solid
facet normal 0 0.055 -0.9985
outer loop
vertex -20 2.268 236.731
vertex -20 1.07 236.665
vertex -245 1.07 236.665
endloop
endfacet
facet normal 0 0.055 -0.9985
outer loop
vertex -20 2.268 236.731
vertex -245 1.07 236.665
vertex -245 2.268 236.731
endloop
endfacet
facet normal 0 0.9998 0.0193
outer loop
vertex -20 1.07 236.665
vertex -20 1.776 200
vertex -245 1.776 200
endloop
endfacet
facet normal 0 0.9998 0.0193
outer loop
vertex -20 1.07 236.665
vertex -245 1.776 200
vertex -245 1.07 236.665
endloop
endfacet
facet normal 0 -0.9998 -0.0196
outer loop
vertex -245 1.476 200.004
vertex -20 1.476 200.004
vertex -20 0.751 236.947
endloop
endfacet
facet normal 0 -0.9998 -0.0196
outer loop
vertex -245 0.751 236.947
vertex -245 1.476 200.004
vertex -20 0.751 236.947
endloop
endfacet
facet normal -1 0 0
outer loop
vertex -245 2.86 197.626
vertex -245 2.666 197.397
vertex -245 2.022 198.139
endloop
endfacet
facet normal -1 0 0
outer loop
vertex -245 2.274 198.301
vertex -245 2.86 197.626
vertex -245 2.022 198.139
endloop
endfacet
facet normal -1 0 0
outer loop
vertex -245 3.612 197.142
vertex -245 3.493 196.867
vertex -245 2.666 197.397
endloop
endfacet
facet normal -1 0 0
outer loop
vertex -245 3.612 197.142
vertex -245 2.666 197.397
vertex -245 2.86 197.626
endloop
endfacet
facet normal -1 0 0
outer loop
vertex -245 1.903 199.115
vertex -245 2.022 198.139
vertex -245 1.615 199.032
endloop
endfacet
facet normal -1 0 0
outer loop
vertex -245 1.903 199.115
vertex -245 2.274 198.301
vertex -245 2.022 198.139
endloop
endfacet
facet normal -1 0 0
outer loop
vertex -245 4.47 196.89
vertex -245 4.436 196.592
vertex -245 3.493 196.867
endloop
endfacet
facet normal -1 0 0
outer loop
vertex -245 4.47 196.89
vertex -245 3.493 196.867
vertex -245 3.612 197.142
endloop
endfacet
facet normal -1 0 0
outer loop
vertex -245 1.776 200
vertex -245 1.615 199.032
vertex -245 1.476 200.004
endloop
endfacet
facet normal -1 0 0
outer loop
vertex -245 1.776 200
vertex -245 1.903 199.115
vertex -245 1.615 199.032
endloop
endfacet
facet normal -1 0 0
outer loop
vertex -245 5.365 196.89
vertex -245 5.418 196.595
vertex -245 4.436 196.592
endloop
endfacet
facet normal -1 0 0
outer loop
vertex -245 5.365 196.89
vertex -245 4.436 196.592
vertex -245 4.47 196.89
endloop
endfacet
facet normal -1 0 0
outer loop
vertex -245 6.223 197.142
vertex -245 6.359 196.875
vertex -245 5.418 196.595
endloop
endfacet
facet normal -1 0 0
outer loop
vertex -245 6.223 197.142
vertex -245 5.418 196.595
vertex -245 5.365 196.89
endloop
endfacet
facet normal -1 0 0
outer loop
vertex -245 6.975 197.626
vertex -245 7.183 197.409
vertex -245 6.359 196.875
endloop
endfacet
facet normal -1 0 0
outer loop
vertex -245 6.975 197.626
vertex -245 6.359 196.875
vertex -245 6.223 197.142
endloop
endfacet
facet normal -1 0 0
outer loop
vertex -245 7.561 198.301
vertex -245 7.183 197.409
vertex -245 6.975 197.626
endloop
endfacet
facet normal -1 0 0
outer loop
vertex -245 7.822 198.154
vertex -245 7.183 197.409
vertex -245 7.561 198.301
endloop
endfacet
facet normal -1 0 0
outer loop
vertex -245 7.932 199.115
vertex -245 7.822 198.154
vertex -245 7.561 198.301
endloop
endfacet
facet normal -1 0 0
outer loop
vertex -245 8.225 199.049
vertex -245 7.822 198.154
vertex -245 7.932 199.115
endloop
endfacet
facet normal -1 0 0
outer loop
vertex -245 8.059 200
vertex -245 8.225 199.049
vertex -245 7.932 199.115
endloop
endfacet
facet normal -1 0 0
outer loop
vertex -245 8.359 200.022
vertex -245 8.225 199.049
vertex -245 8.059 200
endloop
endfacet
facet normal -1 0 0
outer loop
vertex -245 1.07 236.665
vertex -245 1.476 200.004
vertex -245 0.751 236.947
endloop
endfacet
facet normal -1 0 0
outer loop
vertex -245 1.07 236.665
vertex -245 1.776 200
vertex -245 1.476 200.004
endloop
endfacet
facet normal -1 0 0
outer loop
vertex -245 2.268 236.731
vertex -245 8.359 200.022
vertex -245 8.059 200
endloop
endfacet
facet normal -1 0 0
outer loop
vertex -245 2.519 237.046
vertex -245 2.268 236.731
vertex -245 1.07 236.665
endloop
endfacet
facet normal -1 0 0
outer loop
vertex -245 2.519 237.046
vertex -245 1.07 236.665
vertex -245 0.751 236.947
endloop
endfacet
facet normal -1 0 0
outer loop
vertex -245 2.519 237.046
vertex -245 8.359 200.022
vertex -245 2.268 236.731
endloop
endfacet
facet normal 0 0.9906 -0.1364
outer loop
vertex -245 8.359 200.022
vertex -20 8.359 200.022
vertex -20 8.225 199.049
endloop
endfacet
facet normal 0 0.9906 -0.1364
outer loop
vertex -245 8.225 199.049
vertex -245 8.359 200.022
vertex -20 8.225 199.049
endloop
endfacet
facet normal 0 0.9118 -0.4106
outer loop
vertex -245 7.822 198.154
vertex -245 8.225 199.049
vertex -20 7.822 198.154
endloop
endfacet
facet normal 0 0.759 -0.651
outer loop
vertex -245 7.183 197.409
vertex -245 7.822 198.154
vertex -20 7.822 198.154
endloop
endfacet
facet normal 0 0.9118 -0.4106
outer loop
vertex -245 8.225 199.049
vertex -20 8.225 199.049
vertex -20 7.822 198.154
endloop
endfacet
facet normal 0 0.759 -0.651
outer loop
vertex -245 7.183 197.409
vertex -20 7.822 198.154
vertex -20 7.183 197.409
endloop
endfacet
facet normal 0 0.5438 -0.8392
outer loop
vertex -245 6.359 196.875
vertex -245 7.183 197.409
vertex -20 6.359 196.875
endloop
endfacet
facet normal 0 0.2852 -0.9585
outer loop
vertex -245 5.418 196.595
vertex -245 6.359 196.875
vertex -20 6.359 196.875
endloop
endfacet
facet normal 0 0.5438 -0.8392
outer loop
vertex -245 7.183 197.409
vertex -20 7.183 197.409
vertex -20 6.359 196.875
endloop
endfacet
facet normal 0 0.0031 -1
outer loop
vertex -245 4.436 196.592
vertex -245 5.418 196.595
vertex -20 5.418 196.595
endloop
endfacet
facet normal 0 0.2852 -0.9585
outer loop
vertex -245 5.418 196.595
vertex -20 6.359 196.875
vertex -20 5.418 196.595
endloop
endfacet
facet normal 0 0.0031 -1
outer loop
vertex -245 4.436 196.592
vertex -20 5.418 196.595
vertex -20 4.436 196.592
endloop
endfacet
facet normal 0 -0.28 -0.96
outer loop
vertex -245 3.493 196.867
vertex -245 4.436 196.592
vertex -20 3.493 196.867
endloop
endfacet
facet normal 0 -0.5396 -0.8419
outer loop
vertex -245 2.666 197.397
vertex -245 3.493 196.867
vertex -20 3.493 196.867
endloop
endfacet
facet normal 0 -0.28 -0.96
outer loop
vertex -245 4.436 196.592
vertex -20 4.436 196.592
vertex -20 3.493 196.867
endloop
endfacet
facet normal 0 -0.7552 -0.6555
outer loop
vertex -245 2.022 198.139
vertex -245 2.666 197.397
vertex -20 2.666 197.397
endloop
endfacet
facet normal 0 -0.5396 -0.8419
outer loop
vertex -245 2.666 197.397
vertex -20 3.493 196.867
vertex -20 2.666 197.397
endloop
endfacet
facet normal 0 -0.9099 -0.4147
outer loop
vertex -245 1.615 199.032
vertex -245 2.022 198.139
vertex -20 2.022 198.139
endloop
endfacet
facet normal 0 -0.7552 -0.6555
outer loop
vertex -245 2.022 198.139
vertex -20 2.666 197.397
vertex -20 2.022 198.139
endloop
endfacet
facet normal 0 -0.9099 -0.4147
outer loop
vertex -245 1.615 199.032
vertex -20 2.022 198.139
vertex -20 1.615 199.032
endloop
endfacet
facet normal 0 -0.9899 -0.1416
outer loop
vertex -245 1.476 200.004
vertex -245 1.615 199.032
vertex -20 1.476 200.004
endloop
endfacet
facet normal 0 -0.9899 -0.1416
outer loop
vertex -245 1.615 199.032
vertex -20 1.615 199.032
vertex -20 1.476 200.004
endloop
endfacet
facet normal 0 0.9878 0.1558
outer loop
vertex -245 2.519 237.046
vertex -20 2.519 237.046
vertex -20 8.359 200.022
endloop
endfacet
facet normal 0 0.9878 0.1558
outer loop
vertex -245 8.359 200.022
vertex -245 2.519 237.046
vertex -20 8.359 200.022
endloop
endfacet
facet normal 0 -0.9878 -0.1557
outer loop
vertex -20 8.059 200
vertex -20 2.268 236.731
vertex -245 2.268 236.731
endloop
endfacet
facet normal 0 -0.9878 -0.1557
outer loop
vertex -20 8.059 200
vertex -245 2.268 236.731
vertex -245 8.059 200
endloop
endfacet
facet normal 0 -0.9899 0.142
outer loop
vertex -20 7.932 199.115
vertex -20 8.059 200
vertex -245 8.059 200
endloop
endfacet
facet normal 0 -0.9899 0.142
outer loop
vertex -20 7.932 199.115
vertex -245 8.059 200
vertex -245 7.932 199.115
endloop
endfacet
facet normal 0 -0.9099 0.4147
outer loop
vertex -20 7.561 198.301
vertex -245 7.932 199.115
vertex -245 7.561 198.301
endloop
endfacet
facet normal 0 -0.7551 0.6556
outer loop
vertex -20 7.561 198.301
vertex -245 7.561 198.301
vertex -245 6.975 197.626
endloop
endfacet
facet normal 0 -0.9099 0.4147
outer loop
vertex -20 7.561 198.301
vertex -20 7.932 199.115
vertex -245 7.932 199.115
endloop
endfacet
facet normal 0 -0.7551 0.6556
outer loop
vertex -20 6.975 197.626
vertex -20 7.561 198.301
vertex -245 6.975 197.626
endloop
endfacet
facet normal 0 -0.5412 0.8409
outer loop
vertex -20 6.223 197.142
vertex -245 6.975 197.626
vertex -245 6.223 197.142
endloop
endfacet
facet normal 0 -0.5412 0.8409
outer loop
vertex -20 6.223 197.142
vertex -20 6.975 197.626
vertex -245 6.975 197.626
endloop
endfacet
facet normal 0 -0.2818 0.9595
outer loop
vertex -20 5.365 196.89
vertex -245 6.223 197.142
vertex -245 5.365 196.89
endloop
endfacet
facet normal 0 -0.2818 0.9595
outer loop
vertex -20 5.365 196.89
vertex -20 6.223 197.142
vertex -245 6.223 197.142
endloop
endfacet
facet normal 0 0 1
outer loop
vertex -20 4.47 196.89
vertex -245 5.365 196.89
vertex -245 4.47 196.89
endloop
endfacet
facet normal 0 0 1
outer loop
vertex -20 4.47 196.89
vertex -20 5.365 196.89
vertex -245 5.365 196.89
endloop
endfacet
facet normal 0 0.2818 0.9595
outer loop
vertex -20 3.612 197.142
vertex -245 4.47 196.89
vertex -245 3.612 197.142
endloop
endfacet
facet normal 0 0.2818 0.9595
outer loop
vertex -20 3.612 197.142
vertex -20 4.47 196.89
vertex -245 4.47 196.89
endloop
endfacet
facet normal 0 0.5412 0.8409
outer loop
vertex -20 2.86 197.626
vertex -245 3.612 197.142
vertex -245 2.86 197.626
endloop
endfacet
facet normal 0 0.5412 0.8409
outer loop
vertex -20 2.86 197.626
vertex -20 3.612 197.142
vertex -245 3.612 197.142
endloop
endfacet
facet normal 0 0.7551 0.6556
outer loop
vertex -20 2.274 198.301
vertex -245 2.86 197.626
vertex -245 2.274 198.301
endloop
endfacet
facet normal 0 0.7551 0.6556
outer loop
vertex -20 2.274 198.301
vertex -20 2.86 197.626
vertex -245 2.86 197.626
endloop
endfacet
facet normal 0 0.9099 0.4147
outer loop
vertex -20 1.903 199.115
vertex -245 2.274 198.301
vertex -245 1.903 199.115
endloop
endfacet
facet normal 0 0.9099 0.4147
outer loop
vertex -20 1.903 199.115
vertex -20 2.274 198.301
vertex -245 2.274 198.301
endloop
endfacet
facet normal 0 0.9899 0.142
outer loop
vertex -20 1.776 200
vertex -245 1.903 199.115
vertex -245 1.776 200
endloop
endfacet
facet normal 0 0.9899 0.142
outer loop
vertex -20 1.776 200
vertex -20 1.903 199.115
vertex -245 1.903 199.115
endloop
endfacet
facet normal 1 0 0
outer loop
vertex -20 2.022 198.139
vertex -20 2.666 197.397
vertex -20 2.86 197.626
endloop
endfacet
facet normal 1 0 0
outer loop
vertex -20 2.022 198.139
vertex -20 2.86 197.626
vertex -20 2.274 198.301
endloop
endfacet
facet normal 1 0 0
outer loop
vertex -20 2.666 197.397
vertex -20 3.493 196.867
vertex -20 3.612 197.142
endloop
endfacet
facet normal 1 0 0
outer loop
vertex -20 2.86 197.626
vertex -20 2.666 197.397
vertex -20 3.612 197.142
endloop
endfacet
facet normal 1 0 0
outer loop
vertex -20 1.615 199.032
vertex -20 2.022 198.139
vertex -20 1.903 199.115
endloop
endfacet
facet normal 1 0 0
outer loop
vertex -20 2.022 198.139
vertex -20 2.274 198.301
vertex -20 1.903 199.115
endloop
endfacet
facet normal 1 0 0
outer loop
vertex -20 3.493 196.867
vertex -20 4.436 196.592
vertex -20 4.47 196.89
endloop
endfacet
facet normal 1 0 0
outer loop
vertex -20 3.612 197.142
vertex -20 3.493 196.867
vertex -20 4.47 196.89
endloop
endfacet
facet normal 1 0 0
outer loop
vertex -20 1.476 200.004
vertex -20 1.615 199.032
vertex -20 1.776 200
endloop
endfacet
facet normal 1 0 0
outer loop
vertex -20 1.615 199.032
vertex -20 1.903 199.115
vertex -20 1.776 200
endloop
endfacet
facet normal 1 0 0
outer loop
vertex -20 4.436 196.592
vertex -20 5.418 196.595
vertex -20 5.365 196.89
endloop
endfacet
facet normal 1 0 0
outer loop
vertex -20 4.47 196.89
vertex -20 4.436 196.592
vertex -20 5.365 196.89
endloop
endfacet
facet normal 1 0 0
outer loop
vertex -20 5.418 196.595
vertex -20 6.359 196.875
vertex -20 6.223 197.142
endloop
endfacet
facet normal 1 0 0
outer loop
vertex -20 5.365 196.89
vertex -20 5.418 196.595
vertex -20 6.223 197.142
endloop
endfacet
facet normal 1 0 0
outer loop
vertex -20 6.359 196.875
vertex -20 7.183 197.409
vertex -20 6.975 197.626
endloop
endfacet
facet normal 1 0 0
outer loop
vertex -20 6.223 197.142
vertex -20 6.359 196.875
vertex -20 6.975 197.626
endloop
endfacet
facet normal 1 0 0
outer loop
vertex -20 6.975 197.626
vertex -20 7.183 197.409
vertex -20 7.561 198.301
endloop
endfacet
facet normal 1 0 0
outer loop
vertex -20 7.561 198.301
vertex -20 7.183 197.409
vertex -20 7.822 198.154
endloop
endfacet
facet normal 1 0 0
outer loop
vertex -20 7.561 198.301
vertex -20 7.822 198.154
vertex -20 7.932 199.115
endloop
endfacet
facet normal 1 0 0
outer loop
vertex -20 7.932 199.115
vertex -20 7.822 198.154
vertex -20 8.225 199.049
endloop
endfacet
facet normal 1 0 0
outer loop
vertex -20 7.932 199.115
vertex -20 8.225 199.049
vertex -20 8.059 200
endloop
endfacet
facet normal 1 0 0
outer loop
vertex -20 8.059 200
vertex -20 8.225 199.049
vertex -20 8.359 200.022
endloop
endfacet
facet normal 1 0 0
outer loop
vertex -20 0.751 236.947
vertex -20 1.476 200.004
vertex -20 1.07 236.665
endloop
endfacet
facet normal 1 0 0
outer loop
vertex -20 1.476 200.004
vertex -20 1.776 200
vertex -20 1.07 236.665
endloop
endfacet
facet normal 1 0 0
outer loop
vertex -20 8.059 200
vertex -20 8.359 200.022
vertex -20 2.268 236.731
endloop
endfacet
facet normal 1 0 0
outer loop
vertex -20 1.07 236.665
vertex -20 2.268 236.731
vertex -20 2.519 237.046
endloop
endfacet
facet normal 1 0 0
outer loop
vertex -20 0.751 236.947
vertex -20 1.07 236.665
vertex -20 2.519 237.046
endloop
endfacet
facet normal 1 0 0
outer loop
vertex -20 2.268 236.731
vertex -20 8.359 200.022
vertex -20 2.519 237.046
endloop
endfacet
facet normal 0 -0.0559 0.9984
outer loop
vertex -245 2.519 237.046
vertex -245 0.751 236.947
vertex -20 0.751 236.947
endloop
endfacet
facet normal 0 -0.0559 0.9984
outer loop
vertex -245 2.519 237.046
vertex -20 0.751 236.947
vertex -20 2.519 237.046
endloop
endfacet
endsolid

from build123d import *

# Parameters (mm, degrees)
SCHIZZO1_R               = 1.65
CORPOFOAM_DEPTH          = 225
SCHIZZO4_R               = 1.65
CORPOCENTINA_DEPTH       = 5
RIMOZIONEFOAM_DEPTH      = 337.437145013
INTAGLIOPOSTERIORE_DEPTH = 251.179840316
RIVESTIMENTO_DEPTH       = 225
RIMOZIONECENTINA_DEPTH   = 331.394548547


with BuildPart() as part:
    # Schizzo1 → CorpoFoam (new body)
    with BuildSketch(Plane(origin=(0, 0, 0), x_dir=(0, 0, -1), z_dir=(1, 0, 0))):
        with BuildLine():
            ThreePointArc((-200, 8.059305289), (-196.8581753, 4.91748059), (-200, 1.77565589))
            add(Edge.make_bspline(
                [(-200, 8.059305289), (-202.187379866, 7.739758676), (-207.50572073, 6.94925042), (-215.560350587, 5.731221771), (-223.977157043, 4.293295131), (-231.363413337, 3.181808879), (-237.746440905, 2.098942424), (-242.622069367, 1.245861924), (-246.644529334, 0.552864955), (-248.328398442, 0.246216773), (-250.427328459, -0.052966692), (-248.284955517, 0.172375667), (-246.518112421, 0.308690023), (-242.189387345, 0.685693601), (-236.806461265, 1.074101535), (-229.680385953, 1.497317245), (-221.184158699, 1.823218606), (-211.337618209, 1.967626103), (-204.130566759, 1.879296162), (-200.224163887, 1.781432917), (-200, 1.77565589)],
                knots=[0.90015767, 0.90015767, 0.90015767, 0.90015767, 0.913230871, 0.931955467, 0.948342069, 0.963693004, 0.976235918, 0.986320059, 0.993788799, 0.998424035, 1, 1.001588889, 1.006329218, 1.014202456, 1.025172808, 1.039173483, 1.056060631, 1.075578924, 1.097363607, 1.098689812, 1.098689812, 1.098689812, 1.098689812], degree=3))
        make_face()
        with Locations((-200, 4.91748059)):
            Circle(SCHIZZO1_R, mode=Mode.SUBTRACT)
    extrude(amount=CORPOFOAM_DEPTH)

    # Schizzo6 → RimozioneFoam (cut, through all)
    with BuildSketch(Plane.ZY):
        with BuildLine():
            ThreePointArc((200, 8.05930529), (196.8581753, 4.91748059), (200, 1.77565589))
            add(Edge.make_bspline(
                [(200, 1.77565589), (200.224163887, 1.781432917), (204.130566759, 1.879296162), (211.337618209, 1.967626103), (221.184158699, 1.823218606), (229.680385953, 1.497317245), (236.806461265, 1.074101535), (242.189387345, 0.685693601), (246.518112421, 0.308690023), (248.284955517, 0.172375667), (250.427328459, -0.052966692), (248.328398442, 0.246216773), (246.644529334, 0.552864955), (242.622069367, 1.245861924), (237.746440905, 2.098942424), (231.363413337, 3.181808879), (223.977157043, 4.293295131), (215.560350587, 5.731221771), (207.50572073, 6.94925042), (202.187379866, 7.739758676), (200, 8.05930529)],
                knots=[0.90015767, 0.90015767, 0.90015767, 0.90015767, 0.901483875, 0.923268558, 0.942786851, 0.959673998, 0.973674674, 0.984645025, 0.992518264, 0.997258593, 0.998847482, 1.000423447, 1.005058682, 1.012527423, 1.022611563, 1.035154477, 1.050505413, 1.066892015, 1.085616611, 1.098689812, 1.098689812, 1.098689812, 1.098689812], degree=3))
        make_face()
    extrude(amount=-RIMOZIONEFOAM_DEPTH, mode=Mode.SUBTRACT)


with BuildPart() as body_2:
    # Schizzo4 → CorpoCentina (new body)
    with BuildSketch(Plane.ZY.offset(15)):
        with BuildLine():
            ThreePointArc((200, 8.05930529), (196.8581753, 4.91748059), (200, 1.77565589))
            add(Edge.make_bspline(
                [(200, 1.77565589), (200.224163887, 1.781432917), (204.130566759, 1.879296162), (211.337618209, 1.967626103), (221.184158699, 1.823218606), (229.680385953, 1.497317245), (236.806461265, 1.074101535), (242.189387345, 0.685693601), (246.518112421, 0.308690023), (248.284955517, 0.172375667), (250.427328459, -0.052966692), (248.328398442, 0.246216773), (246.644529334, 0.552864955), (242.622069367, 1.245861924), (237.746440905, 2.098942424), (231.363413337, 3.181808879), (223.977157043, 4.293295131), (215.560350587, 5.731221771), (207.50572073, 6.94925042), (202.187379866, 7.739758676), (200, 8.05930529)],
                knots=[0.90015767, 0.90015767, 0.90015767, 0.90015767, 0.901483875, 0.923268558, 0.942786851, 0.959673998, 0.973674674, 0.984645025, 0.992518264, 0.997258593, 0.998847482, 1.000423447, 1.005058682, 1.012527423, 1.022611563, 1.035154477, 1.050505413, 1.066892015, 1.085616611, 1.098689812, 1.098689812, 1.098689812, 1.098689812], degree=3))
        make_face()
        with Locations((200, 4.91748059)):
            Circle(SCHIZZO4_R, mode=Mode.SUBTRACT)
    extrude(amount=CORPOCENTINA_DEPTH)

    # Schizzo7 → IntaglioPosteriore (cut, through all)
    with BuildSketch(Plane.ZY.offset(20)):
        with BuildLine():
            Line((294.445512703, 22.425455209), (238.029690152, 25.569085055))
            Line((238.029690152, 25.569085055), (236.731303845, 2.268144705))
            add(Edge.make_bspline(
                [(236.664540432, 1.070003375), (236.86754193, 1.056774279), (238.902160272, 0.922885243), (242.189387345, 0.685693601), (246.518112421, 0.308690023), (248.284955517, 0.172375667), (250.427328459, -0.052966692), (248.328398442, 0.246216773), (246.644529334, 0.552864955), (242.622069367, 1.245861924), (239.325840074, 1.822597612), (237.195098996, 2.188855706), (236.731303845, 2.268144705)],
                knots=[0.972461039, 0.972461039, 0.972461039, 0.972461039, 0.973674674, 0.984645025, 0.992518264, 0.997258593, 0.998847482, 1.000423447, 1.005058682, 1.012527423, 1.022611563, 1.025405319, 1.025405319, 1.025405319, 1.025405319], degree=3))
            Line((236.664540432, 1.070003375), (235.367531701, -22.206214878))
            Line((235.367531701, -22.206214878), (291.783354252, -25.349844724))
            Line((291.783354252, -25.349844724), (294.445512703, 22.425455209))
        make_face()
        with BuildLine():
            add(Edge.make_bspline(
                [(236.664540432, 1.070003375), (236.86754193, 1.056774279), (238.902160272, 0.922885243), (242.189387345, 0.685693601), (246.518112421, 0.308690023), (248.284955517, 0.172375667), (250.427328459, -0.052966692), (248.328398442, 0.246216773), (246.644529334, 0.552864955), (242.622069367, 1.245861924), (239.325840074, 1.822597612), (237.195098996, 2.188855706), (236.731303845, 2.268144705)],
                knots=[0.972461039, 0.972461039, 0.972461039, 0.972461039, 0.973674674, 0.984645025, 0.992518264, 0.997258593, 0.998847482, 1.000423447, 1.005058682, 1.012527423, 1.022611563, 1.025405319, 1.025405319, 1.025405319, 1.025405319], degree=3))
            Line((236.731303845, 2.268144705), (236.664540432, 1.070003375))
        make_face()
    extrude(amount=-INTAGLIOPOSTERIORE_DEPTH, mode=Mode.SUBTRACT)

    # Schizzo9 → RimozioneCentina (cut, through all)
    with BuildSketch(Plane(origin=(-15, 0, 0), x_dir=(0, 0, -1), z_dir=(1, 0, 0))):
        with BuildLine():
            Line((-236.731303845, 2.268144705), (-236.664540432, 1.070003375))
            add(Edge.make_bspline(
                [(-236.664540432, 1.070003375), (-234.525686034, 1.209387124), (-229.475821131, 1.505164017), (-221.184158699, 1.823218606), (-211.337618209, 1.967626103), (-204.130566759, 1.879296162), (-200.224163887, 1.781432917), (-200, 1.77565589)],
                knots=[0.90015767, 0.90015767, 0.90015767, 0.90015767, 0.91294471, 0.929831858, 0.949350151, 0.971134834, 0.972461039, 0.972461039, 0.972461039, 0.972461039], degree=3))
            ThreePointArc((-200, 1.77565589), (-196.8581753, 4.91748059), (-200, 8.05930529))
            add(Edge.make_bspline(
                [(-200, 8.05930529), (-202.187379866, 7.739758676), (-207.50572073, 6.94925042), (-215.560350587, 5.731221771), (-223.977157043, 4.293295131), (-230.897397414, 3.251935107), (-235.112832905, 2.544833541), (-236.731303845, 2.268144705)],
                knots=[1.025405319, 1.025405319, 1.025405319, 1.025405319, 1.03847852, 1.057203116, 1.073589718, 1.088940654, 1.098689812, 1.098689812, 1.098689812, 1.098689812], degree=3))
        make_face()
    extrude(amount=-RIMOZIONECENTINA_DEPTH, mode=Mode.SUBTRACT)


with BuildPart() as body_2_2:
    # Schizzo8 → Rivestimento (new body)
    with BuildSketch(Plane.ZY.offset(20)):
        with BuildLine():
            Line((236.9472271, 0.750945052), (237.045733203, 2.518743194))
            add(Edge.make_bspline(
                [(237.045733203, 2.518743194), (233.962351817, 3.045868634), (229.318057474, 3.788568713), (223.16497239, 4.745456415), (217.006036982, 5.783792258), (209.288425538, 6.994443084), (203.112011401, 7.907866804), (200.022291432, 8.359233102)],
                knots=[1.024875484, 1.024875484, 1.024875484, 1.024875484, 1.043339562, 1.052571601, 1.06180364, 1.080267718, 1.098731796, 1.098731796, 1.098731796, 1.098731796], degree=3))
            ThreePointArc((200.022291432, 8.359233102), (196.558187514, 4.92664979), (200.003953165, 1.47565816))
            add(Edge.make_bspline(
                [(200.003953165, 1.47565816), (203.082868041, 1.555006238), (209.239827337, 1.652940438), (218.492401608, 1.584321304), (226.161726594, 1.346122551), (232.348041607, 1.039634714), (235.412171703, 0.850980742), (236.9472271, 0.750945052)],
                knots=[0.900150224, 0.900150224, 0.900150224, 0.900150224, 0.918378483, 0.936606742, 0.954835001, 0.96394913, 0.97306326, 0.97306326, 0.97306326, 0.97306326], degree=3))
        make_face()
        with BuildLine():
            Line((236.664540434, 1.070003375), (236.731303845, 2.268144703))
            add(Edge.make_bspline(
                [(236.731303845, 2.268144703), (235.112832905, 2.544833541), (230.897397414, 3.251935107), (223.977157043, 4.293295131), (215.560350587, 5.731221771), (207.50572073, 6.94925042), (202.187379866, 7.739758676), (200, 8.05930529)],
                knots=[1.025405319, 1.025405319, 1.025405319, 1.025405319, 1.035154477, 1.050505413, 1.066892015, 1.085616611, 1.098689812, 1.098689812, 1.098689812, 1.098689812], degree=3))
            ThreePointArc((200, 8.05930529), (196.8581753, 4.91748059), (200, 1.77565589))
            add(Edge.make_bspline(
                [(200, 1.77565589), (200.224163887, 1.781432917), (204.130566759, 1.879296162), (211.337618209, 1.967626103), (221.184158699, 1.823218606), (229.475821132, 1.505164017), (234.525686035, 1.209387123), (236.664540434, 1.070003375)],
                knots=[0.90015767, 0.90015767, 0.90015767, 0.90015767, 0.901483875, 0.923268558, 0.942786851, 0.959673998, 0.972461039, 0.972461039, 0.972461039, 0.972461039], degree=3))
        make_face(mode=Mode.SUBTRACT)
    extrude(amount=RIVESTIMENTO_DEPTH)


solid = body_2_2.part
